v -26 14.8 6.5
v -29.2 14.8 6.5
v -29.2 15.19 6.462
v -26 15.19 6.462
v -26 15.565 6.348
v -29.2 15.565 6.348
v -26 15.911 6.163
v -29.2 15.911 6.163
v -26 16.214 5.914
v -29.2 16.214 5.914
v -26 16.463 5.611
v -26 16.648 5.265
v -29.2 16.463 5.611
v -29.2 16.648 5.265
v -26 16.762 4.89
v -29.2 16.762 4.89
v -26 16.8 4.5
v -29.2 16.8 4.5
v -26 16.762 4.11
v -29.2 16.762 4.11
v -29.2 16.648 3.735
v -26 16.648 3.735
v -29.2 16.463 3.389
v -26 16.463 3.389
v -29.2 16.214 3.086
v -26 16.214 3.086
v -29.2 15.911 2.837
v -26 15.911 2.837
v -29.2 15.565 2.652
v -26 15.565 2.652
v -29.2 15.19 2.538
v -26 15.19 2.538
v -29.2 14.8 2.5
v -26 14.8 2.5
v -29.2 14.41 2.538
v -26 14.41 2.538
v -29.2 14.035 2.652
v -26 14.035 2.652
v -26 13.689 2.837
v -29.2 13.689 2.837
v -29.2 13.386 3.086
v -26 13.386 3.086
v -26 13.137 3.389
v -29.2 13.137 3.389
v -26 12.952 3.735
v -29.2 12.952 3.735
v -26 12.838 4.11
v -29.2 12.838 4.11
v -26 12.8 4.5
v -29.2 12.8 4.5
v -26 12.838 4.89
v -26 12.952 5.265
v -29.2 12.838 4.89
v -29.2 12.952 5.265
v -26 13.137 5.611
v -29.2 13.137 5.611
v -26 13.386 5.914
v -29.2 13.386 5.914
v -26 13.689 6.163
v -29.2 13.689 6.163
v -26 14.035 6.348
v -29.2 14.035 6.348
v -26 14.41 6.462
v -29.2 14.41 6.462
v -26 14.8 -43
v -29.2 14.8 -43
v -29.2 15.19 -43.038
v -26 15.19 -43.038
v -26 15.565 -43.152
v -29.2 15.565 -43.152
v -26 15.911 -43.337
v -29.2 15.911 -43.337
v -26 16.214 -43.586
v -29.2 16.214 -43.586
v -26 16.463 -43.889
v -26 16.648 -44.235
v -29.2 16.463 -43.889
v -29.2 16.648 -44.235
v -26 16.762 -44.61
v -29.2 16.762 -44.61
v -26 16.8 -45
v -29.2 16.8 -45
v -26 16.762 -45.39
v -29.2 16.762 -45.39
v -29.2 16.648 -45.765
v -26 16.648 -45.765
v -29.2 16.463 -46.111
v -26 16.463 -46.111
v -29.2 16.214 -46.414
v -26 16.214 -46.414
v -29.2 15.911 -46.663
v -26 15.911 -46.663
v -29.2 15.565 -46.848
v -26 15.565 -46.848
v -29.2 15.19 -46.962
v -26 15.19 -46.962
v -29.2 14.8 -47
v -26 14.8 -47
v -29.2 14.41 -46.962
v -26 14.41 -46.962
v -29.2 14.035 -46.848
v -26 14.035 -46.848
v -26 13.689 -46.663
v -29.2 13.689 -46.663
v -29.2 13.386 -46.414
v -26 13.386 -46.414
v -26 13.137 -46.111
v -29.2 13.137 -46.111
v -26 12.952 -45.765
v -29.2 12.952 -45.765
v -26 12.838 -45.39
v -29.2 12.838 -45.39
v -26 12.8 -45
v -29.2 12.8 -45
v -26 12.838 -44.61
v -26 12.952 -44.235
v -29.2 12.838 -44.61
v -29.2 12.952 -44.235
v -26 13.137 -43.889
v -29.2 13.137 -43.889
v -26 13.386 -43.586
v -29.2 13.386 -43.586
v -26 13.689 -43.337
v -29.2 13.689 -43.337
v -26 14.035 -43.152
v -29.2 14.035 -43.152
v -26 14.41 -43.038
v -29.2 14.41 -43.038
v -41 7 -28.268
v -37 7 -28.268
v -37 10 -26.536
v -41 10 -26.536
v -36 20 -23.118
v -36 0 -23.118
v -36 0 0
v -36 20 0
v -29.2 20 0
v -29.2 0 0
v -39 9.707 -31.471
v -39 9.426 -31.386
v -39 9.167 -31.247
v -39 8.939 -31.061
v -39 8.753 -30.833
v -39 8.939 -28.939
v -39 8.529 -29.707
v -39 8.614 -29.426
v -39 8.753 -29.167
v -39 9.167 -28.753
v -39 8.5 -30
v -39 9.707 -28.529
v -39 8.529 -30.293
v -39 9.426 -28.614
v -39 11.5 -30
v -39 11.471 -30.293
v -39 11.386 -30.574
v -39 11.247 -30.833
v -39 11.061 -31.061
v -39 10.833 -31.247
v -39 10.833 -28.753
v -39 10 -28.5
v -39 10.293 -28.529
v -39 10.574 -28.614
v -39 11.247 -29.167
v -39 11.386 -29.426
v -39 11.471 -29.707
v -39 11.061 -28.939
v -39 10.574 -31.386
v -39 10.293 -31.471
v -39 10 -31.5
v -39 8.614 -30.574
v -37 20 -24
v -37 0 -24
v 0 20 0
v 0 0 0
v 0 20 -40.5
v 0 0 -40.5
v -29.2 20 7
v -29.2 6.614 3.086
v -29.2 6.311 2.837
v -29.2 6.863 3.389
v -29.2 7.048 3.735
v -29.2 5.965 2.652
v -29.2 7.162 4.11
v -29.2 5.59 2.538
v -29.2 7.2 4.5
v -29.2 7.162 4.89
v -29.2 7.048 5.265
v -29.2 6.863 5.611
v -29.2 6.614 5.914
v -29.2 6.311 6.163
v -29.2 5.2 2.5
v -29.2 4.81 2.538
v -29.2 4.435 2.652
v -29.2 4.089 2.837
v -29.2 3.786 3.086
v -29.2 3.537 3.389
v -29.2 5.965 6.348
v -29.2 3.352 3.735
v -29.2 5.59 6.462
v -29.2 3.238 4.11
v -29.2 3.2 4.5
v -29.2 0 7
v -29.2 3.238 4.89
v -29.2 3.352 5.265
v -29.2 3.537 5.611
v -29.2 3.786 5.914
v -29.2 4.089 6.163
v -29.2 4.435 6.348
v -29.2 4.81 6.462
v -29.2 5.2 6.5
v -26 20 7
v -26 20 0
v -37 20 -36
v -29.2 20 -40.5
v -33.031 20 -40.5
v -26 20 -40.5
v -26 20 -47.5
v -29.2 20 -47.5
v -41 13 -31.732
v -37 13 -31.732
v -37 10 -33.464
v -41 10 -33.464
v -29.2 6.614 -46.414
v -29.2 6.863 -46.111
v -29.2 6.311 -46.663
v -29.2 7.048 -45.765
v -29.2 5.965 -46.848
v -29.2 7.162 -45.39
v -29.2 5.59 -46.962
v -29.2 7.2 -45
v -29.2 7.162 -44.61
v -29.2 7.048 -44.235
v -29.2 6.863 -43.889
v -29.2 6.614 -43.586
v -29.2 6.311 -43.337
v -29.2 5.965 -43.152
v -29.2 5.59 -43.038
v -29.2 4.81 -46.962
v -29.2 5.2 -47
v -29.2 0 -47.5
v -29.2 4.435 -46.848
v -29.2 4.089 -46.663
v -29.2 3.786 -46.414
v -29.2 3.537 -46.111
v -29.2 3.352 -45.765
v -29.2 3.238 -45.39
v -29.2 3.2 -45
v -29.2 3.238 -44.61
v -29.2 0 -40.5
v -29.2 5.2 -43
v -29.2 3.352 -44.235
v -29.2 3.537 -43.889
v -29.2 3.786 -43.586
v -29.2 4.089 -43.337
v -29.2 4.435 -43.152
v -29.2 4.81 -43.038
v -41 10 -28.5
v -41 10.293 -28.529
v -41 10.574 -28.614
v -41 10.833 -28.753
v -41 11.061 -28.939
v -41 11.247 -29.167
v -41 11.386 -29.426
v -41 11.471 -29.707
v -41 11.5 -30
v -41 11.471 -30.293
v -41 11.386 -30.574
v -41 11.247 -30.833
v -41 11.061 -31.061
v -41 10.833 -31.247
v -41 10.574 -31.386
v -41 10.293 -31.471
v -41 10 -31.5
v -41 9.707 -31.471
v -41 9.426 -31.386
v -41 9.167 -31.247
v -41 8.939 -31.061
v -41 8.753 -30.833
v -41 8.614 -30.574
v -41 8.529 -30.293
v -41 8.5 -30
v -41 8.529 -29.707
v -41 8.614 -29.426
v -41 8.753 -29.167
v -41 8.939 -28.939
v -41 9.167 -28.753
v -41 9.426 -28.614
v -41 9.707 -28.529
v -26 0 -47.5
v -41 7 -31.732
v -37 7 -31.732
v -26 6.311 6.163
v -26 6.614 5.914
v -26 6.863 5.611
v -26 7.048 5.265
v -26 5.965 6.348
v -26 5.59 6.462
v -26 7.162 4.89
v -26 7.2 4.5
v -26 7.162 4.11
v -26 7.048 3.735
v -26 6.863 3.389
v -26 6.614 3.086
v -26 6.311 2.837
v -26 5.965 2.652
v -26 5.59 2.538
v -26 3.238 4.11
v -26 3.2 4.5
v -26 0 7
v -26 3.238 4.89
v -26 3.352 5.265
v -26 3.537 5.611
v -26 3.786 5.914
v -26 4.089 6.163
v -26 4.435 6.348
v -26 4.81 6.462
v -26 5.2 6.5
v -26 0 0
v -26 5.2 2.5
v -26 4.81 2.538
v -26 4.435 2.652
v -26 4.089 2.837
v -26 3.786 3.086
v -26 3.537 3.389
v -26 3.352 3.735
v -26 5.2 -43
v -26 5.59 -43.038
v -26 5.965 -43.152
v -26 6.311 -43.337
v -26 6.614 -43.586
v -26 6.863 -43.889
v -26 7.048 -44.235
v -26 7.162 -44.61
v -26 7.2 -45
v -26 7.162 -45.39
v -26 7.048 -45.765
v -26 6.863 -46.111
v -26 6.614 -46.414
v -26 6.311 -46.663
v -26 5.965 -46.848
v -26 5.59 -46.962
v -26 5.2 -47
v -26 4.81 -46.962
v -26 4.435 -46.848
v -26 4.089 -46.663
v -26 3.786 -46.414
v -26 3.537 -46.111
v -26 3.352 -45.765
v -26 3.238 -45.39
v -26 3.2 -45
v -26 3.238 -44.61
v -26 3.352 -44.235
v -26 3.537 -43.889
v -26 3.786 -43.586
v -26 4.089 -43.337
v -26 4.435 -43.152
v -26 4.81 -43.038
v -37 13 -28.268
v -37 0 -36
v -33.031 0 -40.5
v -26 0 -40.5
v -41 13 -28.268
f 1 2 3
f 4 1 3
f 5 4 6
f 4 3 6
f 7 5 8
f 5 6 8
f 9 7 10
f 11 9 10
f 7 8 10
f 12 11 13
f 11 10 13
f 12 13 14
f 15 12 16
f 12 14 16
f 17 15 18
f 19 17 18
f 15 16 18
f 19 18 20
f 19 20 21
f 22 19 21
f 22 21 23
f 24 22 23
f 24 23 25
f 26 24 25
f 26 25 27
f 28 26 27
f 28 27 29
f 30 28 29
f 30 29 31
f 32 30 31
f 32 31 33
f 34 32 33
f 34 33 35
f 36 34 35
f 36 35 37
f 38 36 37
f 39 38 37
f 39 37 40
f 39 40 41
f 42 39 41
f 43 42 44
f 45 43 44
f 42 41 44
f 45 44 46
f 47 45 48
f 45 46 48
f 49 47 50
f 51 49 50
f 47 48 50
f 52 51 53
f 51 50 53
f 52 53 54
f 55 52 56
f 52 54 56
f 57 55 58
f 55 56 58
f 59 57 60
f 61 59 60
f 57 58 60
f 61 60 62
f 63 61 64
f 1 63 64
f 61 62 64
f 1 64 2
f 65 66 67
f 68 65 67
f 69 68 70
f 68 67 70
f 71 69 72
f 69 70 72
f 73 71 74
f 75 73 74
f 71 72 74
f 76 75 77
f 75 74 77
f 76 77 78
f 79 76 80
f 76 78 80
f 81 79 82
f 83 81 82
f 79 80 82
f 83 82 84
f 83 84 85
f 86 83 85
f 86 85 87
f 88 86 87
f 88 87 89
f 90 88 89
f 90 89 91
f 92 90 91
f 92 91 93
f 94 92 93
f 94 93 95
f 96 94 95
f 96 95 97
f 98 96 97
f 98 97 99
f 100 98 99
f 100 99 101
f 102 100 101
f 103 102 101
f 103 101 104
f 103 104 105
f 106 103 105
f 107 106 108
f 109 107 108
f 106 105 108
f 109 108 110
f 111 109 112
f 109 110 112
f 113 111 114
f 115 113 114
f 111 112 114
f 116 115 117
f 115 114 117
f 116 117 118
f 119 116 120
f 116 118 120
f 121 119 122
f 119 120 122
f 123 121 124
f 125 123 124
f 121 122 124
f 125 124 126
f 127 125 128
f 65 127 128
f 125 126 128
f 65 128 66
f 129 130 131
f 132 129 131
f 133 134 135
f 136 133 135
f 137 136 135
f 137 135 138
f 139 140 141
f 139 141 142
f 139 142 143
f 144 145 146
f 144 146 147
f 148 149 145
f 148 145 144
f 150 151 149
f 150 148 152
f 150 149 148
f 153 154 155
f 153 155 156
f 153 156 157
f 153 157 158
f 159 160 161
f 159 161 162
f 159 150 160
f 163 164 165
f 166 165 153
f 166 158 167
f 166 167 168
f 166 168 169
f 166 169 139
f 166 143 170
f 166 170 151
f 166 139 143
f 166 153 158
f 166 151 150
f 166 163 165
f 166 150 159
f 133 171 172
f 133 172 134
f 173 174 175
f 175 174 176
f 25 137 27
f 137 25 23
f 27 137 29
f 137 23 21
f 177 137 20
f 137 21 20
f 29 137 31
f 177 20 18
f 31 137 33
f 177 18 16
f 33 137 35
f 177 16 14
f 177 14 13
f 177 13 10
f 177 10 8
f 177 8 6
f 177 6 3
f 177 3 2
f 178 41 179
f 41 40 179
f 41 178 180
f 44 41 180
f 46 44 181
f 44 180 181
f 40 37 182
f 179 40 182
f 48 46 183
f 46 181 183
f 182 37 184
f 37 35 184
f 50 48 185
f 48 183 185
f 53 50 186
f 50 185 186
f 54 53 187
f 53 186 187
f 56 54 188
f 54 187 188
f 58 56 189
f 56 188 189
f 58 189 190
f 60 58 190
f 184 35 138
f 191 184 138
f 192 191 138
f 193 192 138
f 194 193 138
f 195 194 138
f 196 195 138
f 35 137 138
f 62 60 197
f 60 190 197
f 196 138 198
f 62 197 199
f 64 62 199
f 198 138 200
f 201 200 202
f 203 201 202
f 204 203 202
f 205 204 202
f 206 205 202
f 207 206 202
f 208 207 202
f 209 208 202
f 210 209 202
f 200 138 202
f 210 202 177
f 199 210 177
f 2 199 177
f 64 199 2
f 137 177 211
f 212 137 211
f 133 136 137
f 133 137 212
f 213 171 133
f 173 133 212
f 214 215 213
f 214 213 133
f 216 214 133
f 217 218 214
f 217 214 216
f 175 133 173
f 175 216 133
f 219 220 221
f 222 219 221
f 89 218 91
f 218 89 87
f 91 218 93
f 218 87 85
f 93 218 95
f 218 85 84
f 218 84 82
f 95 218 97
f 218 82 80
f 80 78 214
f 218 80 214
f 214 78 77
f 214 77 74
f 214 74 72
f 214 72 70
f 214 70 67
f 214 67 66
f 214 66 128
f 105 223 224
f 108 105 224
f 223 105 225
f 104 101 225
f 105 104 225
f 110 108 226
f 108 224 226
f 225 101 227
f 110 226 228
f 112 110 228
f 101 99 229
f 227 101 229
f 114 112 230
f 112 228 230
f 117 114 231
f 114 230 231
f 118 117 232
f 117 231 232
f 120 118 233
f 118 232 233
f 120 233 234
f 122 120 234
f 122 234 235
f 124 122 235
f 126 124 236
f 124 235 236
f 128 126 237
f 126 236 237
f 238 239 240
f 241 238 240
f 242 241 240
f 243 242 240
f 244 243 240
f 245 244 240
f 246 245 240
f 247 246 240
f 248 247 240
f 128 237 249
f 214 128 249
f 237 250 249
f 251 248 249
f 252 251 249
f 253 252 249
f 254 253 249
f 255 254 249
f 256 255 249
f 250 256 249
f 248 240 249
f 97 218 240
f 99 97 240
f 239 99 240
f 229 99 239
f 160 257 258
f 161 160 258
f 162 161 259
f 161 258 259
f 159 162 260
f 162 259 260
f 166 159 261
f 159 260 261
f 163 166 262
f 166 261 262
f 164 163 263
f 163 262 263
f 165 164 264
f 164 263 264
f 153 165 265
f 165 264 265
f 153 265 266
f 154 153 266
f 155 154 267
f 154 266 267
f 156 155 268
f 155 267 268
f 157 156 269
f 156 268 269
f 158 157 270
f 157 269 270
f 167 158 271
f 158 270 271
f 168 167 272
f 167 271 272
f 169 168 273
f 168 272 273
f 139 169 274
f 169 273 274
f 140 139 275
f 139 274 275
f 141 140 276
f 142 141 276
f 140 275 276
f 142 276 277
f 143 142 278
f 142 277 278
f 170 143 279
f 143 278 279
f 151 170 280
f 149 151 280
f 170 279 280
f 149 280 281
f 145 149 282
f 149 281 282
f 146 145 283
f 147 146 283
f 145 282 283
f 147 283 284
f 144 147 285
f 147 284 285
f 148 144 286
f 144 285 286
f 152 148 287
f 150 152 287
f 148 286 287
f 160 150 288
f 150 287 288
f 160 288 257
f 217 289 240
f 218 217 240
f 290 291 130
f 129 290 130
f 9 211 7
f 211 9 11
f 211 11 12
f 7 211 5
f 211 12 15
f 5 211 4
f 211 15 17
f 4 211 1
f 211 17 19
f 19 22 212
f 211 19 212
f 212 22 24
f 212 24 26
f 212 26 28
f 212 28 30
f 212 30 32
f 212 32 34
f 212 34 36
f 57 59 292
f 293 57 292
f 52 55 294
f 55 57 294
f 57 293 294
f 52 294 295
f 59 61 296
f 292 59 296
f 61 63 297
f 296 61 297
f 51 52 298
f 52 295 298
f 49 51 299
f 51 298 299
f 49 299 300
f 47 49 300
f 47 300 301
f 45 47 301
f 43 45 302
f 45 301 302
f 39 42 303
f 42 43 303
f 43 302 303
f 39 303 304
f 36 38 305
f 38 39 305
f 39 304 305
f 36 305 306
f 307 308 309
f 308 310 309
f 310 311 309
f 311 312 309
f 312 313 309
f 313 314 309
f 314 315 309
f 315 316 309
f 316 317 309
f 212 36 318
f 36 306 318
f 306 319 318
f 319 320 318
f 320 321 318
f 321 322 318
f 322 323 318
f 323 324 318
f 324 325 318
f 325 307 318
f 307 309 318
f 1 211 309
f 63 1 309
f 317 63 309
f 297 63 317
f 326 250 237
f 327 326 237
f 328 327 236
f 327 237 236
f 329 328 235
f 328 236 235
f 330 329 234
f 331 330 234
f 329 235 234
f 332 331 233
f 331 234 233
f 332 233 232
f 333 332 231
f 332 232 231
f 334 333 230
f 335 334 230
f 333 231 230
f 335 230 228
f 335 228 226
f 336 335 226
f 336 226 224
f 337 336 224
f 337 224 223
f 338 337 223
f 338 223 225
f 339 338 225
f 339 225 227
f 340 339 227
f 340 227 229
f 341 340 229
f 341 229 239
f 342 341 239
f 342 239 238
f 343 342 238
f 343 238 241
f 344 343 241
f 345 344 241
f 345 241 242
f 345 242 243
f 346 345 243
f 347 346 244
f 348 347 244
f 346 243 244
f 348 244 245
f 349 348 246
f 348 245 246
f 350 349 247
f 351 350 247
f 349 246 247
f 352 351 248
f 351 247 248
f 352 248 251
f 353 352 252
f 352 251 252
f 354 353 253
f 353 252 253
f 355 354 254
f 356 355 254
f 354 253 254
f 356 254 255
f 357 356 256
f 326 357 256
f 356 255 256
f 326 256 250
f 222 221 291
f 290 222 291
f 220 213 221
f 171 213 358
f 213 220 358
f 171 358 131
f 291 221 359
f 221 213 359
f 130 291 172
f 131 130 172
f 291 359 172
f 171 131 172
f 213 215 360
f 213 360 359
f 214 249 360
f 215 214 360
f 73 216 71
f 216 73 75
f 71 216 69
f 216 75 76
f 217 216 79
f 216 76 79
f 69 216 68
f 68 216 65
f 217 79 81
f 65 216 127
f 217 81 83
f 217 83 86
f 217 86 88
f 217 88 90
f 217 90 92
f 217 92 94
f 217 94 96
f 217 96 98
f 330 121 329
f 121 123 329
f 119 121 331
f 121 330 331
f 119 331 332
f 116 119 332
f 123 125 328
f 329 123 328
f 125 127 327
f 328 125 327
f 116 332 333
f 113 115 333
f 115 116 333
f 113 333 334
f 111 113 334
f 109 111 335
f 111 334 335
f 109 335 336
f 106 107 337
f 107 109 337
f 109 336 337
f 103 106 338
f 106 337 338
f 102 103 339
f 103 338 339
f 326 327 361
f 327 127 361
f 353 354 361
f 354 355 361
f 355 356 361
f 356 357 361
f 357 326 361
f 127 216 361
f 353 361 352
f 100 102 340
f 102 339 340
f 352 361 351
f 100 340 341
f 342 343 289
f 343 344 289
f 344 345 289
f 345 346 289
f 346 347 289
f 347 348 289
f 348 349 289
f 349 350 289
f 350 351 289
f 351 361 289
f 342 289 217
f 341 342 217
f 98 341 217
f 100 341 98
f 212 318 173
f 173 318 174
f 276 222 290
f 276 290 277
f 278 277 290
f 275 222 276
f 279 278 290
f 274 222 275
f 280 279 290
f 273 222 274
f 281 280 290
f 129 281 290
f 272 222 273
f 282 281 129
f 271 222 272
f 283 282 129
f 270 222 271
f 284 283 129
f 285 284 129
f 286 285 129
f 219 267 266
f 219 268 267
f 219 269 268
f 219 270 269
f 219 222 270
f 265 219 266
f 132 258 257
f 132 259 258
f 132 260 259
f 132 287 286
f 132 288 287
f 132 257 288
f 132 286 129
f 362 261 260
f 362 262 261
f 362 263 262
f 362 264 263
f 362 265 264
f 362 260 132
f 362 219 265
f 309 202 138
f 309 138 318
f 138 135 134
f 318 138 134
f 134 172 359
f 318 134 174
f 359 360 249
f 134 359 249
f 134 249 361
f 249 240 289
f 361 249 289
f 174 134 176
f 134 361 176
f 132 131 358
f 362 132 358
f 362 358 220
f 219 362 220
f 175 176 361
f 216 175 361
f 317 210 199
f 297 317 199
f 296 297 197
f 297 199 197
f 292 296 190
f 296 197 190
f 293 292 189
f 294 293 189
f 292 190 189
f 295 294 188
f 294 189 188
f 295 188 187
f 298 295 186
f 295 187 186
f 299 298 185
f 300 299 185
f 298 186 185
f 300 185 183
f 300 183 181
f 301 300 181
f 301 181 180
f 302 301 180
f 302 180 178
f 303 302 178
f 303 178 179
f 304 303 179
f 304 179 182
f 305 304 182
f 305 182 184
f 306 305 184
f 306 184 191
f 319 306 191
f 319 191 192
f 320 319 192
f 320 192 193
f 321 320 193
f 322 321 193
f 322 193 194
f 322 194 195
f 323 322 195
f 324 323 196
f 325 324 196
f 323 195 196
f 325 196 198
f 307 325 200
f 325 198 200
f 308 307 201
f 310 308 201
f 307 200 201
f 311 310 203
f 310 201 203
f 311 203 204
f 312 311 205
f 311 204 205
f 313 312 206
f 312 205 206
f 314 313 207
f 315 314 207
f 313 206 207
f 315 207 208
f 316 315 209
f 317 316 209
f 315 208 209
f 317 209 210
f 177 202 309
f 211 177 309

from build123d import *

# Parameters (mm, degrees)
BOSS_EXTRUDE1_DEPTH = 20
BOSS_EXTRUDE2_DEPTH = 4
SKETCH3_R           = 2
CUT_EXTRUDE1_DEPTH  = 30.2
SKETCH4_R           = 1.5
CUT_EXTRUDE2_DEPTH  = 2


with BuildPart() as part:
    # Sketch1 → Boss-Extrude1 (new body)
    with BuildSketch(Plane(origin=(0, 0, 0), x_dir=(1, 0, 0), z_dir=(0, 1, 0))):
        Polygon((0, 0), (0, 40.5), (-26, 40.5), (-26, 47.5), (-29.2, 47.5), (-29.2, 40.5), (-33.031373033, 40.5), (-37, 36), (-37, 24), (-36, 23.118082896), (-36, 0), (-29.2, 0), (-29.2, -7), (-26, -7), (-26, 0), align=None)
    extrude(amount=BOSS_EXTRUDE1_DEPTH)

    # Sketch2 → Boss-Extrude2 (add)
    with BuildSketch(Plane.ZY.offset(37)):
        Polygon((-33.464101615, 10), (-31.732050808, 7), (-28.267949192, 7), (-26.535898385, 10), (-28.267949192, 13), (-31.732050808, 13), align=None)
    extrude(amount=BOSS_EXTRUDE2_DEPTH)

    # Sketch3 → Cut-Extrude1 (cut, through all)
    with BuildSketch(Plane.ZY.offset(29.2)):
        with Locations((-45, 5.2)):
            Circle(SKETCH3_R)
        with Locations((-45, 14.8)):
            Circle(SKETCH3_R)
        with Locations((4.5, 14.8)):
            Circle(SKETCH3_R)
        with Locations((4.5, 5.2)):
            Circle(SKETCH3_R)
    extrude(amount=-CUT_EXTRUDE1_DEPTH, mode=Mode.SUBTRACT)

    # Sketch4 → Cut-Extrude2 (cut)
    with BuildSketch(Plane.ZY.offset(41)):
        with Locations((-30, 10)):
            Circle(SKETCH4_R)
    extrude(amount=-CUT_EXTRUDE2_DEPTH, mode=Mode.SUBTRACT)


solid = part.part
